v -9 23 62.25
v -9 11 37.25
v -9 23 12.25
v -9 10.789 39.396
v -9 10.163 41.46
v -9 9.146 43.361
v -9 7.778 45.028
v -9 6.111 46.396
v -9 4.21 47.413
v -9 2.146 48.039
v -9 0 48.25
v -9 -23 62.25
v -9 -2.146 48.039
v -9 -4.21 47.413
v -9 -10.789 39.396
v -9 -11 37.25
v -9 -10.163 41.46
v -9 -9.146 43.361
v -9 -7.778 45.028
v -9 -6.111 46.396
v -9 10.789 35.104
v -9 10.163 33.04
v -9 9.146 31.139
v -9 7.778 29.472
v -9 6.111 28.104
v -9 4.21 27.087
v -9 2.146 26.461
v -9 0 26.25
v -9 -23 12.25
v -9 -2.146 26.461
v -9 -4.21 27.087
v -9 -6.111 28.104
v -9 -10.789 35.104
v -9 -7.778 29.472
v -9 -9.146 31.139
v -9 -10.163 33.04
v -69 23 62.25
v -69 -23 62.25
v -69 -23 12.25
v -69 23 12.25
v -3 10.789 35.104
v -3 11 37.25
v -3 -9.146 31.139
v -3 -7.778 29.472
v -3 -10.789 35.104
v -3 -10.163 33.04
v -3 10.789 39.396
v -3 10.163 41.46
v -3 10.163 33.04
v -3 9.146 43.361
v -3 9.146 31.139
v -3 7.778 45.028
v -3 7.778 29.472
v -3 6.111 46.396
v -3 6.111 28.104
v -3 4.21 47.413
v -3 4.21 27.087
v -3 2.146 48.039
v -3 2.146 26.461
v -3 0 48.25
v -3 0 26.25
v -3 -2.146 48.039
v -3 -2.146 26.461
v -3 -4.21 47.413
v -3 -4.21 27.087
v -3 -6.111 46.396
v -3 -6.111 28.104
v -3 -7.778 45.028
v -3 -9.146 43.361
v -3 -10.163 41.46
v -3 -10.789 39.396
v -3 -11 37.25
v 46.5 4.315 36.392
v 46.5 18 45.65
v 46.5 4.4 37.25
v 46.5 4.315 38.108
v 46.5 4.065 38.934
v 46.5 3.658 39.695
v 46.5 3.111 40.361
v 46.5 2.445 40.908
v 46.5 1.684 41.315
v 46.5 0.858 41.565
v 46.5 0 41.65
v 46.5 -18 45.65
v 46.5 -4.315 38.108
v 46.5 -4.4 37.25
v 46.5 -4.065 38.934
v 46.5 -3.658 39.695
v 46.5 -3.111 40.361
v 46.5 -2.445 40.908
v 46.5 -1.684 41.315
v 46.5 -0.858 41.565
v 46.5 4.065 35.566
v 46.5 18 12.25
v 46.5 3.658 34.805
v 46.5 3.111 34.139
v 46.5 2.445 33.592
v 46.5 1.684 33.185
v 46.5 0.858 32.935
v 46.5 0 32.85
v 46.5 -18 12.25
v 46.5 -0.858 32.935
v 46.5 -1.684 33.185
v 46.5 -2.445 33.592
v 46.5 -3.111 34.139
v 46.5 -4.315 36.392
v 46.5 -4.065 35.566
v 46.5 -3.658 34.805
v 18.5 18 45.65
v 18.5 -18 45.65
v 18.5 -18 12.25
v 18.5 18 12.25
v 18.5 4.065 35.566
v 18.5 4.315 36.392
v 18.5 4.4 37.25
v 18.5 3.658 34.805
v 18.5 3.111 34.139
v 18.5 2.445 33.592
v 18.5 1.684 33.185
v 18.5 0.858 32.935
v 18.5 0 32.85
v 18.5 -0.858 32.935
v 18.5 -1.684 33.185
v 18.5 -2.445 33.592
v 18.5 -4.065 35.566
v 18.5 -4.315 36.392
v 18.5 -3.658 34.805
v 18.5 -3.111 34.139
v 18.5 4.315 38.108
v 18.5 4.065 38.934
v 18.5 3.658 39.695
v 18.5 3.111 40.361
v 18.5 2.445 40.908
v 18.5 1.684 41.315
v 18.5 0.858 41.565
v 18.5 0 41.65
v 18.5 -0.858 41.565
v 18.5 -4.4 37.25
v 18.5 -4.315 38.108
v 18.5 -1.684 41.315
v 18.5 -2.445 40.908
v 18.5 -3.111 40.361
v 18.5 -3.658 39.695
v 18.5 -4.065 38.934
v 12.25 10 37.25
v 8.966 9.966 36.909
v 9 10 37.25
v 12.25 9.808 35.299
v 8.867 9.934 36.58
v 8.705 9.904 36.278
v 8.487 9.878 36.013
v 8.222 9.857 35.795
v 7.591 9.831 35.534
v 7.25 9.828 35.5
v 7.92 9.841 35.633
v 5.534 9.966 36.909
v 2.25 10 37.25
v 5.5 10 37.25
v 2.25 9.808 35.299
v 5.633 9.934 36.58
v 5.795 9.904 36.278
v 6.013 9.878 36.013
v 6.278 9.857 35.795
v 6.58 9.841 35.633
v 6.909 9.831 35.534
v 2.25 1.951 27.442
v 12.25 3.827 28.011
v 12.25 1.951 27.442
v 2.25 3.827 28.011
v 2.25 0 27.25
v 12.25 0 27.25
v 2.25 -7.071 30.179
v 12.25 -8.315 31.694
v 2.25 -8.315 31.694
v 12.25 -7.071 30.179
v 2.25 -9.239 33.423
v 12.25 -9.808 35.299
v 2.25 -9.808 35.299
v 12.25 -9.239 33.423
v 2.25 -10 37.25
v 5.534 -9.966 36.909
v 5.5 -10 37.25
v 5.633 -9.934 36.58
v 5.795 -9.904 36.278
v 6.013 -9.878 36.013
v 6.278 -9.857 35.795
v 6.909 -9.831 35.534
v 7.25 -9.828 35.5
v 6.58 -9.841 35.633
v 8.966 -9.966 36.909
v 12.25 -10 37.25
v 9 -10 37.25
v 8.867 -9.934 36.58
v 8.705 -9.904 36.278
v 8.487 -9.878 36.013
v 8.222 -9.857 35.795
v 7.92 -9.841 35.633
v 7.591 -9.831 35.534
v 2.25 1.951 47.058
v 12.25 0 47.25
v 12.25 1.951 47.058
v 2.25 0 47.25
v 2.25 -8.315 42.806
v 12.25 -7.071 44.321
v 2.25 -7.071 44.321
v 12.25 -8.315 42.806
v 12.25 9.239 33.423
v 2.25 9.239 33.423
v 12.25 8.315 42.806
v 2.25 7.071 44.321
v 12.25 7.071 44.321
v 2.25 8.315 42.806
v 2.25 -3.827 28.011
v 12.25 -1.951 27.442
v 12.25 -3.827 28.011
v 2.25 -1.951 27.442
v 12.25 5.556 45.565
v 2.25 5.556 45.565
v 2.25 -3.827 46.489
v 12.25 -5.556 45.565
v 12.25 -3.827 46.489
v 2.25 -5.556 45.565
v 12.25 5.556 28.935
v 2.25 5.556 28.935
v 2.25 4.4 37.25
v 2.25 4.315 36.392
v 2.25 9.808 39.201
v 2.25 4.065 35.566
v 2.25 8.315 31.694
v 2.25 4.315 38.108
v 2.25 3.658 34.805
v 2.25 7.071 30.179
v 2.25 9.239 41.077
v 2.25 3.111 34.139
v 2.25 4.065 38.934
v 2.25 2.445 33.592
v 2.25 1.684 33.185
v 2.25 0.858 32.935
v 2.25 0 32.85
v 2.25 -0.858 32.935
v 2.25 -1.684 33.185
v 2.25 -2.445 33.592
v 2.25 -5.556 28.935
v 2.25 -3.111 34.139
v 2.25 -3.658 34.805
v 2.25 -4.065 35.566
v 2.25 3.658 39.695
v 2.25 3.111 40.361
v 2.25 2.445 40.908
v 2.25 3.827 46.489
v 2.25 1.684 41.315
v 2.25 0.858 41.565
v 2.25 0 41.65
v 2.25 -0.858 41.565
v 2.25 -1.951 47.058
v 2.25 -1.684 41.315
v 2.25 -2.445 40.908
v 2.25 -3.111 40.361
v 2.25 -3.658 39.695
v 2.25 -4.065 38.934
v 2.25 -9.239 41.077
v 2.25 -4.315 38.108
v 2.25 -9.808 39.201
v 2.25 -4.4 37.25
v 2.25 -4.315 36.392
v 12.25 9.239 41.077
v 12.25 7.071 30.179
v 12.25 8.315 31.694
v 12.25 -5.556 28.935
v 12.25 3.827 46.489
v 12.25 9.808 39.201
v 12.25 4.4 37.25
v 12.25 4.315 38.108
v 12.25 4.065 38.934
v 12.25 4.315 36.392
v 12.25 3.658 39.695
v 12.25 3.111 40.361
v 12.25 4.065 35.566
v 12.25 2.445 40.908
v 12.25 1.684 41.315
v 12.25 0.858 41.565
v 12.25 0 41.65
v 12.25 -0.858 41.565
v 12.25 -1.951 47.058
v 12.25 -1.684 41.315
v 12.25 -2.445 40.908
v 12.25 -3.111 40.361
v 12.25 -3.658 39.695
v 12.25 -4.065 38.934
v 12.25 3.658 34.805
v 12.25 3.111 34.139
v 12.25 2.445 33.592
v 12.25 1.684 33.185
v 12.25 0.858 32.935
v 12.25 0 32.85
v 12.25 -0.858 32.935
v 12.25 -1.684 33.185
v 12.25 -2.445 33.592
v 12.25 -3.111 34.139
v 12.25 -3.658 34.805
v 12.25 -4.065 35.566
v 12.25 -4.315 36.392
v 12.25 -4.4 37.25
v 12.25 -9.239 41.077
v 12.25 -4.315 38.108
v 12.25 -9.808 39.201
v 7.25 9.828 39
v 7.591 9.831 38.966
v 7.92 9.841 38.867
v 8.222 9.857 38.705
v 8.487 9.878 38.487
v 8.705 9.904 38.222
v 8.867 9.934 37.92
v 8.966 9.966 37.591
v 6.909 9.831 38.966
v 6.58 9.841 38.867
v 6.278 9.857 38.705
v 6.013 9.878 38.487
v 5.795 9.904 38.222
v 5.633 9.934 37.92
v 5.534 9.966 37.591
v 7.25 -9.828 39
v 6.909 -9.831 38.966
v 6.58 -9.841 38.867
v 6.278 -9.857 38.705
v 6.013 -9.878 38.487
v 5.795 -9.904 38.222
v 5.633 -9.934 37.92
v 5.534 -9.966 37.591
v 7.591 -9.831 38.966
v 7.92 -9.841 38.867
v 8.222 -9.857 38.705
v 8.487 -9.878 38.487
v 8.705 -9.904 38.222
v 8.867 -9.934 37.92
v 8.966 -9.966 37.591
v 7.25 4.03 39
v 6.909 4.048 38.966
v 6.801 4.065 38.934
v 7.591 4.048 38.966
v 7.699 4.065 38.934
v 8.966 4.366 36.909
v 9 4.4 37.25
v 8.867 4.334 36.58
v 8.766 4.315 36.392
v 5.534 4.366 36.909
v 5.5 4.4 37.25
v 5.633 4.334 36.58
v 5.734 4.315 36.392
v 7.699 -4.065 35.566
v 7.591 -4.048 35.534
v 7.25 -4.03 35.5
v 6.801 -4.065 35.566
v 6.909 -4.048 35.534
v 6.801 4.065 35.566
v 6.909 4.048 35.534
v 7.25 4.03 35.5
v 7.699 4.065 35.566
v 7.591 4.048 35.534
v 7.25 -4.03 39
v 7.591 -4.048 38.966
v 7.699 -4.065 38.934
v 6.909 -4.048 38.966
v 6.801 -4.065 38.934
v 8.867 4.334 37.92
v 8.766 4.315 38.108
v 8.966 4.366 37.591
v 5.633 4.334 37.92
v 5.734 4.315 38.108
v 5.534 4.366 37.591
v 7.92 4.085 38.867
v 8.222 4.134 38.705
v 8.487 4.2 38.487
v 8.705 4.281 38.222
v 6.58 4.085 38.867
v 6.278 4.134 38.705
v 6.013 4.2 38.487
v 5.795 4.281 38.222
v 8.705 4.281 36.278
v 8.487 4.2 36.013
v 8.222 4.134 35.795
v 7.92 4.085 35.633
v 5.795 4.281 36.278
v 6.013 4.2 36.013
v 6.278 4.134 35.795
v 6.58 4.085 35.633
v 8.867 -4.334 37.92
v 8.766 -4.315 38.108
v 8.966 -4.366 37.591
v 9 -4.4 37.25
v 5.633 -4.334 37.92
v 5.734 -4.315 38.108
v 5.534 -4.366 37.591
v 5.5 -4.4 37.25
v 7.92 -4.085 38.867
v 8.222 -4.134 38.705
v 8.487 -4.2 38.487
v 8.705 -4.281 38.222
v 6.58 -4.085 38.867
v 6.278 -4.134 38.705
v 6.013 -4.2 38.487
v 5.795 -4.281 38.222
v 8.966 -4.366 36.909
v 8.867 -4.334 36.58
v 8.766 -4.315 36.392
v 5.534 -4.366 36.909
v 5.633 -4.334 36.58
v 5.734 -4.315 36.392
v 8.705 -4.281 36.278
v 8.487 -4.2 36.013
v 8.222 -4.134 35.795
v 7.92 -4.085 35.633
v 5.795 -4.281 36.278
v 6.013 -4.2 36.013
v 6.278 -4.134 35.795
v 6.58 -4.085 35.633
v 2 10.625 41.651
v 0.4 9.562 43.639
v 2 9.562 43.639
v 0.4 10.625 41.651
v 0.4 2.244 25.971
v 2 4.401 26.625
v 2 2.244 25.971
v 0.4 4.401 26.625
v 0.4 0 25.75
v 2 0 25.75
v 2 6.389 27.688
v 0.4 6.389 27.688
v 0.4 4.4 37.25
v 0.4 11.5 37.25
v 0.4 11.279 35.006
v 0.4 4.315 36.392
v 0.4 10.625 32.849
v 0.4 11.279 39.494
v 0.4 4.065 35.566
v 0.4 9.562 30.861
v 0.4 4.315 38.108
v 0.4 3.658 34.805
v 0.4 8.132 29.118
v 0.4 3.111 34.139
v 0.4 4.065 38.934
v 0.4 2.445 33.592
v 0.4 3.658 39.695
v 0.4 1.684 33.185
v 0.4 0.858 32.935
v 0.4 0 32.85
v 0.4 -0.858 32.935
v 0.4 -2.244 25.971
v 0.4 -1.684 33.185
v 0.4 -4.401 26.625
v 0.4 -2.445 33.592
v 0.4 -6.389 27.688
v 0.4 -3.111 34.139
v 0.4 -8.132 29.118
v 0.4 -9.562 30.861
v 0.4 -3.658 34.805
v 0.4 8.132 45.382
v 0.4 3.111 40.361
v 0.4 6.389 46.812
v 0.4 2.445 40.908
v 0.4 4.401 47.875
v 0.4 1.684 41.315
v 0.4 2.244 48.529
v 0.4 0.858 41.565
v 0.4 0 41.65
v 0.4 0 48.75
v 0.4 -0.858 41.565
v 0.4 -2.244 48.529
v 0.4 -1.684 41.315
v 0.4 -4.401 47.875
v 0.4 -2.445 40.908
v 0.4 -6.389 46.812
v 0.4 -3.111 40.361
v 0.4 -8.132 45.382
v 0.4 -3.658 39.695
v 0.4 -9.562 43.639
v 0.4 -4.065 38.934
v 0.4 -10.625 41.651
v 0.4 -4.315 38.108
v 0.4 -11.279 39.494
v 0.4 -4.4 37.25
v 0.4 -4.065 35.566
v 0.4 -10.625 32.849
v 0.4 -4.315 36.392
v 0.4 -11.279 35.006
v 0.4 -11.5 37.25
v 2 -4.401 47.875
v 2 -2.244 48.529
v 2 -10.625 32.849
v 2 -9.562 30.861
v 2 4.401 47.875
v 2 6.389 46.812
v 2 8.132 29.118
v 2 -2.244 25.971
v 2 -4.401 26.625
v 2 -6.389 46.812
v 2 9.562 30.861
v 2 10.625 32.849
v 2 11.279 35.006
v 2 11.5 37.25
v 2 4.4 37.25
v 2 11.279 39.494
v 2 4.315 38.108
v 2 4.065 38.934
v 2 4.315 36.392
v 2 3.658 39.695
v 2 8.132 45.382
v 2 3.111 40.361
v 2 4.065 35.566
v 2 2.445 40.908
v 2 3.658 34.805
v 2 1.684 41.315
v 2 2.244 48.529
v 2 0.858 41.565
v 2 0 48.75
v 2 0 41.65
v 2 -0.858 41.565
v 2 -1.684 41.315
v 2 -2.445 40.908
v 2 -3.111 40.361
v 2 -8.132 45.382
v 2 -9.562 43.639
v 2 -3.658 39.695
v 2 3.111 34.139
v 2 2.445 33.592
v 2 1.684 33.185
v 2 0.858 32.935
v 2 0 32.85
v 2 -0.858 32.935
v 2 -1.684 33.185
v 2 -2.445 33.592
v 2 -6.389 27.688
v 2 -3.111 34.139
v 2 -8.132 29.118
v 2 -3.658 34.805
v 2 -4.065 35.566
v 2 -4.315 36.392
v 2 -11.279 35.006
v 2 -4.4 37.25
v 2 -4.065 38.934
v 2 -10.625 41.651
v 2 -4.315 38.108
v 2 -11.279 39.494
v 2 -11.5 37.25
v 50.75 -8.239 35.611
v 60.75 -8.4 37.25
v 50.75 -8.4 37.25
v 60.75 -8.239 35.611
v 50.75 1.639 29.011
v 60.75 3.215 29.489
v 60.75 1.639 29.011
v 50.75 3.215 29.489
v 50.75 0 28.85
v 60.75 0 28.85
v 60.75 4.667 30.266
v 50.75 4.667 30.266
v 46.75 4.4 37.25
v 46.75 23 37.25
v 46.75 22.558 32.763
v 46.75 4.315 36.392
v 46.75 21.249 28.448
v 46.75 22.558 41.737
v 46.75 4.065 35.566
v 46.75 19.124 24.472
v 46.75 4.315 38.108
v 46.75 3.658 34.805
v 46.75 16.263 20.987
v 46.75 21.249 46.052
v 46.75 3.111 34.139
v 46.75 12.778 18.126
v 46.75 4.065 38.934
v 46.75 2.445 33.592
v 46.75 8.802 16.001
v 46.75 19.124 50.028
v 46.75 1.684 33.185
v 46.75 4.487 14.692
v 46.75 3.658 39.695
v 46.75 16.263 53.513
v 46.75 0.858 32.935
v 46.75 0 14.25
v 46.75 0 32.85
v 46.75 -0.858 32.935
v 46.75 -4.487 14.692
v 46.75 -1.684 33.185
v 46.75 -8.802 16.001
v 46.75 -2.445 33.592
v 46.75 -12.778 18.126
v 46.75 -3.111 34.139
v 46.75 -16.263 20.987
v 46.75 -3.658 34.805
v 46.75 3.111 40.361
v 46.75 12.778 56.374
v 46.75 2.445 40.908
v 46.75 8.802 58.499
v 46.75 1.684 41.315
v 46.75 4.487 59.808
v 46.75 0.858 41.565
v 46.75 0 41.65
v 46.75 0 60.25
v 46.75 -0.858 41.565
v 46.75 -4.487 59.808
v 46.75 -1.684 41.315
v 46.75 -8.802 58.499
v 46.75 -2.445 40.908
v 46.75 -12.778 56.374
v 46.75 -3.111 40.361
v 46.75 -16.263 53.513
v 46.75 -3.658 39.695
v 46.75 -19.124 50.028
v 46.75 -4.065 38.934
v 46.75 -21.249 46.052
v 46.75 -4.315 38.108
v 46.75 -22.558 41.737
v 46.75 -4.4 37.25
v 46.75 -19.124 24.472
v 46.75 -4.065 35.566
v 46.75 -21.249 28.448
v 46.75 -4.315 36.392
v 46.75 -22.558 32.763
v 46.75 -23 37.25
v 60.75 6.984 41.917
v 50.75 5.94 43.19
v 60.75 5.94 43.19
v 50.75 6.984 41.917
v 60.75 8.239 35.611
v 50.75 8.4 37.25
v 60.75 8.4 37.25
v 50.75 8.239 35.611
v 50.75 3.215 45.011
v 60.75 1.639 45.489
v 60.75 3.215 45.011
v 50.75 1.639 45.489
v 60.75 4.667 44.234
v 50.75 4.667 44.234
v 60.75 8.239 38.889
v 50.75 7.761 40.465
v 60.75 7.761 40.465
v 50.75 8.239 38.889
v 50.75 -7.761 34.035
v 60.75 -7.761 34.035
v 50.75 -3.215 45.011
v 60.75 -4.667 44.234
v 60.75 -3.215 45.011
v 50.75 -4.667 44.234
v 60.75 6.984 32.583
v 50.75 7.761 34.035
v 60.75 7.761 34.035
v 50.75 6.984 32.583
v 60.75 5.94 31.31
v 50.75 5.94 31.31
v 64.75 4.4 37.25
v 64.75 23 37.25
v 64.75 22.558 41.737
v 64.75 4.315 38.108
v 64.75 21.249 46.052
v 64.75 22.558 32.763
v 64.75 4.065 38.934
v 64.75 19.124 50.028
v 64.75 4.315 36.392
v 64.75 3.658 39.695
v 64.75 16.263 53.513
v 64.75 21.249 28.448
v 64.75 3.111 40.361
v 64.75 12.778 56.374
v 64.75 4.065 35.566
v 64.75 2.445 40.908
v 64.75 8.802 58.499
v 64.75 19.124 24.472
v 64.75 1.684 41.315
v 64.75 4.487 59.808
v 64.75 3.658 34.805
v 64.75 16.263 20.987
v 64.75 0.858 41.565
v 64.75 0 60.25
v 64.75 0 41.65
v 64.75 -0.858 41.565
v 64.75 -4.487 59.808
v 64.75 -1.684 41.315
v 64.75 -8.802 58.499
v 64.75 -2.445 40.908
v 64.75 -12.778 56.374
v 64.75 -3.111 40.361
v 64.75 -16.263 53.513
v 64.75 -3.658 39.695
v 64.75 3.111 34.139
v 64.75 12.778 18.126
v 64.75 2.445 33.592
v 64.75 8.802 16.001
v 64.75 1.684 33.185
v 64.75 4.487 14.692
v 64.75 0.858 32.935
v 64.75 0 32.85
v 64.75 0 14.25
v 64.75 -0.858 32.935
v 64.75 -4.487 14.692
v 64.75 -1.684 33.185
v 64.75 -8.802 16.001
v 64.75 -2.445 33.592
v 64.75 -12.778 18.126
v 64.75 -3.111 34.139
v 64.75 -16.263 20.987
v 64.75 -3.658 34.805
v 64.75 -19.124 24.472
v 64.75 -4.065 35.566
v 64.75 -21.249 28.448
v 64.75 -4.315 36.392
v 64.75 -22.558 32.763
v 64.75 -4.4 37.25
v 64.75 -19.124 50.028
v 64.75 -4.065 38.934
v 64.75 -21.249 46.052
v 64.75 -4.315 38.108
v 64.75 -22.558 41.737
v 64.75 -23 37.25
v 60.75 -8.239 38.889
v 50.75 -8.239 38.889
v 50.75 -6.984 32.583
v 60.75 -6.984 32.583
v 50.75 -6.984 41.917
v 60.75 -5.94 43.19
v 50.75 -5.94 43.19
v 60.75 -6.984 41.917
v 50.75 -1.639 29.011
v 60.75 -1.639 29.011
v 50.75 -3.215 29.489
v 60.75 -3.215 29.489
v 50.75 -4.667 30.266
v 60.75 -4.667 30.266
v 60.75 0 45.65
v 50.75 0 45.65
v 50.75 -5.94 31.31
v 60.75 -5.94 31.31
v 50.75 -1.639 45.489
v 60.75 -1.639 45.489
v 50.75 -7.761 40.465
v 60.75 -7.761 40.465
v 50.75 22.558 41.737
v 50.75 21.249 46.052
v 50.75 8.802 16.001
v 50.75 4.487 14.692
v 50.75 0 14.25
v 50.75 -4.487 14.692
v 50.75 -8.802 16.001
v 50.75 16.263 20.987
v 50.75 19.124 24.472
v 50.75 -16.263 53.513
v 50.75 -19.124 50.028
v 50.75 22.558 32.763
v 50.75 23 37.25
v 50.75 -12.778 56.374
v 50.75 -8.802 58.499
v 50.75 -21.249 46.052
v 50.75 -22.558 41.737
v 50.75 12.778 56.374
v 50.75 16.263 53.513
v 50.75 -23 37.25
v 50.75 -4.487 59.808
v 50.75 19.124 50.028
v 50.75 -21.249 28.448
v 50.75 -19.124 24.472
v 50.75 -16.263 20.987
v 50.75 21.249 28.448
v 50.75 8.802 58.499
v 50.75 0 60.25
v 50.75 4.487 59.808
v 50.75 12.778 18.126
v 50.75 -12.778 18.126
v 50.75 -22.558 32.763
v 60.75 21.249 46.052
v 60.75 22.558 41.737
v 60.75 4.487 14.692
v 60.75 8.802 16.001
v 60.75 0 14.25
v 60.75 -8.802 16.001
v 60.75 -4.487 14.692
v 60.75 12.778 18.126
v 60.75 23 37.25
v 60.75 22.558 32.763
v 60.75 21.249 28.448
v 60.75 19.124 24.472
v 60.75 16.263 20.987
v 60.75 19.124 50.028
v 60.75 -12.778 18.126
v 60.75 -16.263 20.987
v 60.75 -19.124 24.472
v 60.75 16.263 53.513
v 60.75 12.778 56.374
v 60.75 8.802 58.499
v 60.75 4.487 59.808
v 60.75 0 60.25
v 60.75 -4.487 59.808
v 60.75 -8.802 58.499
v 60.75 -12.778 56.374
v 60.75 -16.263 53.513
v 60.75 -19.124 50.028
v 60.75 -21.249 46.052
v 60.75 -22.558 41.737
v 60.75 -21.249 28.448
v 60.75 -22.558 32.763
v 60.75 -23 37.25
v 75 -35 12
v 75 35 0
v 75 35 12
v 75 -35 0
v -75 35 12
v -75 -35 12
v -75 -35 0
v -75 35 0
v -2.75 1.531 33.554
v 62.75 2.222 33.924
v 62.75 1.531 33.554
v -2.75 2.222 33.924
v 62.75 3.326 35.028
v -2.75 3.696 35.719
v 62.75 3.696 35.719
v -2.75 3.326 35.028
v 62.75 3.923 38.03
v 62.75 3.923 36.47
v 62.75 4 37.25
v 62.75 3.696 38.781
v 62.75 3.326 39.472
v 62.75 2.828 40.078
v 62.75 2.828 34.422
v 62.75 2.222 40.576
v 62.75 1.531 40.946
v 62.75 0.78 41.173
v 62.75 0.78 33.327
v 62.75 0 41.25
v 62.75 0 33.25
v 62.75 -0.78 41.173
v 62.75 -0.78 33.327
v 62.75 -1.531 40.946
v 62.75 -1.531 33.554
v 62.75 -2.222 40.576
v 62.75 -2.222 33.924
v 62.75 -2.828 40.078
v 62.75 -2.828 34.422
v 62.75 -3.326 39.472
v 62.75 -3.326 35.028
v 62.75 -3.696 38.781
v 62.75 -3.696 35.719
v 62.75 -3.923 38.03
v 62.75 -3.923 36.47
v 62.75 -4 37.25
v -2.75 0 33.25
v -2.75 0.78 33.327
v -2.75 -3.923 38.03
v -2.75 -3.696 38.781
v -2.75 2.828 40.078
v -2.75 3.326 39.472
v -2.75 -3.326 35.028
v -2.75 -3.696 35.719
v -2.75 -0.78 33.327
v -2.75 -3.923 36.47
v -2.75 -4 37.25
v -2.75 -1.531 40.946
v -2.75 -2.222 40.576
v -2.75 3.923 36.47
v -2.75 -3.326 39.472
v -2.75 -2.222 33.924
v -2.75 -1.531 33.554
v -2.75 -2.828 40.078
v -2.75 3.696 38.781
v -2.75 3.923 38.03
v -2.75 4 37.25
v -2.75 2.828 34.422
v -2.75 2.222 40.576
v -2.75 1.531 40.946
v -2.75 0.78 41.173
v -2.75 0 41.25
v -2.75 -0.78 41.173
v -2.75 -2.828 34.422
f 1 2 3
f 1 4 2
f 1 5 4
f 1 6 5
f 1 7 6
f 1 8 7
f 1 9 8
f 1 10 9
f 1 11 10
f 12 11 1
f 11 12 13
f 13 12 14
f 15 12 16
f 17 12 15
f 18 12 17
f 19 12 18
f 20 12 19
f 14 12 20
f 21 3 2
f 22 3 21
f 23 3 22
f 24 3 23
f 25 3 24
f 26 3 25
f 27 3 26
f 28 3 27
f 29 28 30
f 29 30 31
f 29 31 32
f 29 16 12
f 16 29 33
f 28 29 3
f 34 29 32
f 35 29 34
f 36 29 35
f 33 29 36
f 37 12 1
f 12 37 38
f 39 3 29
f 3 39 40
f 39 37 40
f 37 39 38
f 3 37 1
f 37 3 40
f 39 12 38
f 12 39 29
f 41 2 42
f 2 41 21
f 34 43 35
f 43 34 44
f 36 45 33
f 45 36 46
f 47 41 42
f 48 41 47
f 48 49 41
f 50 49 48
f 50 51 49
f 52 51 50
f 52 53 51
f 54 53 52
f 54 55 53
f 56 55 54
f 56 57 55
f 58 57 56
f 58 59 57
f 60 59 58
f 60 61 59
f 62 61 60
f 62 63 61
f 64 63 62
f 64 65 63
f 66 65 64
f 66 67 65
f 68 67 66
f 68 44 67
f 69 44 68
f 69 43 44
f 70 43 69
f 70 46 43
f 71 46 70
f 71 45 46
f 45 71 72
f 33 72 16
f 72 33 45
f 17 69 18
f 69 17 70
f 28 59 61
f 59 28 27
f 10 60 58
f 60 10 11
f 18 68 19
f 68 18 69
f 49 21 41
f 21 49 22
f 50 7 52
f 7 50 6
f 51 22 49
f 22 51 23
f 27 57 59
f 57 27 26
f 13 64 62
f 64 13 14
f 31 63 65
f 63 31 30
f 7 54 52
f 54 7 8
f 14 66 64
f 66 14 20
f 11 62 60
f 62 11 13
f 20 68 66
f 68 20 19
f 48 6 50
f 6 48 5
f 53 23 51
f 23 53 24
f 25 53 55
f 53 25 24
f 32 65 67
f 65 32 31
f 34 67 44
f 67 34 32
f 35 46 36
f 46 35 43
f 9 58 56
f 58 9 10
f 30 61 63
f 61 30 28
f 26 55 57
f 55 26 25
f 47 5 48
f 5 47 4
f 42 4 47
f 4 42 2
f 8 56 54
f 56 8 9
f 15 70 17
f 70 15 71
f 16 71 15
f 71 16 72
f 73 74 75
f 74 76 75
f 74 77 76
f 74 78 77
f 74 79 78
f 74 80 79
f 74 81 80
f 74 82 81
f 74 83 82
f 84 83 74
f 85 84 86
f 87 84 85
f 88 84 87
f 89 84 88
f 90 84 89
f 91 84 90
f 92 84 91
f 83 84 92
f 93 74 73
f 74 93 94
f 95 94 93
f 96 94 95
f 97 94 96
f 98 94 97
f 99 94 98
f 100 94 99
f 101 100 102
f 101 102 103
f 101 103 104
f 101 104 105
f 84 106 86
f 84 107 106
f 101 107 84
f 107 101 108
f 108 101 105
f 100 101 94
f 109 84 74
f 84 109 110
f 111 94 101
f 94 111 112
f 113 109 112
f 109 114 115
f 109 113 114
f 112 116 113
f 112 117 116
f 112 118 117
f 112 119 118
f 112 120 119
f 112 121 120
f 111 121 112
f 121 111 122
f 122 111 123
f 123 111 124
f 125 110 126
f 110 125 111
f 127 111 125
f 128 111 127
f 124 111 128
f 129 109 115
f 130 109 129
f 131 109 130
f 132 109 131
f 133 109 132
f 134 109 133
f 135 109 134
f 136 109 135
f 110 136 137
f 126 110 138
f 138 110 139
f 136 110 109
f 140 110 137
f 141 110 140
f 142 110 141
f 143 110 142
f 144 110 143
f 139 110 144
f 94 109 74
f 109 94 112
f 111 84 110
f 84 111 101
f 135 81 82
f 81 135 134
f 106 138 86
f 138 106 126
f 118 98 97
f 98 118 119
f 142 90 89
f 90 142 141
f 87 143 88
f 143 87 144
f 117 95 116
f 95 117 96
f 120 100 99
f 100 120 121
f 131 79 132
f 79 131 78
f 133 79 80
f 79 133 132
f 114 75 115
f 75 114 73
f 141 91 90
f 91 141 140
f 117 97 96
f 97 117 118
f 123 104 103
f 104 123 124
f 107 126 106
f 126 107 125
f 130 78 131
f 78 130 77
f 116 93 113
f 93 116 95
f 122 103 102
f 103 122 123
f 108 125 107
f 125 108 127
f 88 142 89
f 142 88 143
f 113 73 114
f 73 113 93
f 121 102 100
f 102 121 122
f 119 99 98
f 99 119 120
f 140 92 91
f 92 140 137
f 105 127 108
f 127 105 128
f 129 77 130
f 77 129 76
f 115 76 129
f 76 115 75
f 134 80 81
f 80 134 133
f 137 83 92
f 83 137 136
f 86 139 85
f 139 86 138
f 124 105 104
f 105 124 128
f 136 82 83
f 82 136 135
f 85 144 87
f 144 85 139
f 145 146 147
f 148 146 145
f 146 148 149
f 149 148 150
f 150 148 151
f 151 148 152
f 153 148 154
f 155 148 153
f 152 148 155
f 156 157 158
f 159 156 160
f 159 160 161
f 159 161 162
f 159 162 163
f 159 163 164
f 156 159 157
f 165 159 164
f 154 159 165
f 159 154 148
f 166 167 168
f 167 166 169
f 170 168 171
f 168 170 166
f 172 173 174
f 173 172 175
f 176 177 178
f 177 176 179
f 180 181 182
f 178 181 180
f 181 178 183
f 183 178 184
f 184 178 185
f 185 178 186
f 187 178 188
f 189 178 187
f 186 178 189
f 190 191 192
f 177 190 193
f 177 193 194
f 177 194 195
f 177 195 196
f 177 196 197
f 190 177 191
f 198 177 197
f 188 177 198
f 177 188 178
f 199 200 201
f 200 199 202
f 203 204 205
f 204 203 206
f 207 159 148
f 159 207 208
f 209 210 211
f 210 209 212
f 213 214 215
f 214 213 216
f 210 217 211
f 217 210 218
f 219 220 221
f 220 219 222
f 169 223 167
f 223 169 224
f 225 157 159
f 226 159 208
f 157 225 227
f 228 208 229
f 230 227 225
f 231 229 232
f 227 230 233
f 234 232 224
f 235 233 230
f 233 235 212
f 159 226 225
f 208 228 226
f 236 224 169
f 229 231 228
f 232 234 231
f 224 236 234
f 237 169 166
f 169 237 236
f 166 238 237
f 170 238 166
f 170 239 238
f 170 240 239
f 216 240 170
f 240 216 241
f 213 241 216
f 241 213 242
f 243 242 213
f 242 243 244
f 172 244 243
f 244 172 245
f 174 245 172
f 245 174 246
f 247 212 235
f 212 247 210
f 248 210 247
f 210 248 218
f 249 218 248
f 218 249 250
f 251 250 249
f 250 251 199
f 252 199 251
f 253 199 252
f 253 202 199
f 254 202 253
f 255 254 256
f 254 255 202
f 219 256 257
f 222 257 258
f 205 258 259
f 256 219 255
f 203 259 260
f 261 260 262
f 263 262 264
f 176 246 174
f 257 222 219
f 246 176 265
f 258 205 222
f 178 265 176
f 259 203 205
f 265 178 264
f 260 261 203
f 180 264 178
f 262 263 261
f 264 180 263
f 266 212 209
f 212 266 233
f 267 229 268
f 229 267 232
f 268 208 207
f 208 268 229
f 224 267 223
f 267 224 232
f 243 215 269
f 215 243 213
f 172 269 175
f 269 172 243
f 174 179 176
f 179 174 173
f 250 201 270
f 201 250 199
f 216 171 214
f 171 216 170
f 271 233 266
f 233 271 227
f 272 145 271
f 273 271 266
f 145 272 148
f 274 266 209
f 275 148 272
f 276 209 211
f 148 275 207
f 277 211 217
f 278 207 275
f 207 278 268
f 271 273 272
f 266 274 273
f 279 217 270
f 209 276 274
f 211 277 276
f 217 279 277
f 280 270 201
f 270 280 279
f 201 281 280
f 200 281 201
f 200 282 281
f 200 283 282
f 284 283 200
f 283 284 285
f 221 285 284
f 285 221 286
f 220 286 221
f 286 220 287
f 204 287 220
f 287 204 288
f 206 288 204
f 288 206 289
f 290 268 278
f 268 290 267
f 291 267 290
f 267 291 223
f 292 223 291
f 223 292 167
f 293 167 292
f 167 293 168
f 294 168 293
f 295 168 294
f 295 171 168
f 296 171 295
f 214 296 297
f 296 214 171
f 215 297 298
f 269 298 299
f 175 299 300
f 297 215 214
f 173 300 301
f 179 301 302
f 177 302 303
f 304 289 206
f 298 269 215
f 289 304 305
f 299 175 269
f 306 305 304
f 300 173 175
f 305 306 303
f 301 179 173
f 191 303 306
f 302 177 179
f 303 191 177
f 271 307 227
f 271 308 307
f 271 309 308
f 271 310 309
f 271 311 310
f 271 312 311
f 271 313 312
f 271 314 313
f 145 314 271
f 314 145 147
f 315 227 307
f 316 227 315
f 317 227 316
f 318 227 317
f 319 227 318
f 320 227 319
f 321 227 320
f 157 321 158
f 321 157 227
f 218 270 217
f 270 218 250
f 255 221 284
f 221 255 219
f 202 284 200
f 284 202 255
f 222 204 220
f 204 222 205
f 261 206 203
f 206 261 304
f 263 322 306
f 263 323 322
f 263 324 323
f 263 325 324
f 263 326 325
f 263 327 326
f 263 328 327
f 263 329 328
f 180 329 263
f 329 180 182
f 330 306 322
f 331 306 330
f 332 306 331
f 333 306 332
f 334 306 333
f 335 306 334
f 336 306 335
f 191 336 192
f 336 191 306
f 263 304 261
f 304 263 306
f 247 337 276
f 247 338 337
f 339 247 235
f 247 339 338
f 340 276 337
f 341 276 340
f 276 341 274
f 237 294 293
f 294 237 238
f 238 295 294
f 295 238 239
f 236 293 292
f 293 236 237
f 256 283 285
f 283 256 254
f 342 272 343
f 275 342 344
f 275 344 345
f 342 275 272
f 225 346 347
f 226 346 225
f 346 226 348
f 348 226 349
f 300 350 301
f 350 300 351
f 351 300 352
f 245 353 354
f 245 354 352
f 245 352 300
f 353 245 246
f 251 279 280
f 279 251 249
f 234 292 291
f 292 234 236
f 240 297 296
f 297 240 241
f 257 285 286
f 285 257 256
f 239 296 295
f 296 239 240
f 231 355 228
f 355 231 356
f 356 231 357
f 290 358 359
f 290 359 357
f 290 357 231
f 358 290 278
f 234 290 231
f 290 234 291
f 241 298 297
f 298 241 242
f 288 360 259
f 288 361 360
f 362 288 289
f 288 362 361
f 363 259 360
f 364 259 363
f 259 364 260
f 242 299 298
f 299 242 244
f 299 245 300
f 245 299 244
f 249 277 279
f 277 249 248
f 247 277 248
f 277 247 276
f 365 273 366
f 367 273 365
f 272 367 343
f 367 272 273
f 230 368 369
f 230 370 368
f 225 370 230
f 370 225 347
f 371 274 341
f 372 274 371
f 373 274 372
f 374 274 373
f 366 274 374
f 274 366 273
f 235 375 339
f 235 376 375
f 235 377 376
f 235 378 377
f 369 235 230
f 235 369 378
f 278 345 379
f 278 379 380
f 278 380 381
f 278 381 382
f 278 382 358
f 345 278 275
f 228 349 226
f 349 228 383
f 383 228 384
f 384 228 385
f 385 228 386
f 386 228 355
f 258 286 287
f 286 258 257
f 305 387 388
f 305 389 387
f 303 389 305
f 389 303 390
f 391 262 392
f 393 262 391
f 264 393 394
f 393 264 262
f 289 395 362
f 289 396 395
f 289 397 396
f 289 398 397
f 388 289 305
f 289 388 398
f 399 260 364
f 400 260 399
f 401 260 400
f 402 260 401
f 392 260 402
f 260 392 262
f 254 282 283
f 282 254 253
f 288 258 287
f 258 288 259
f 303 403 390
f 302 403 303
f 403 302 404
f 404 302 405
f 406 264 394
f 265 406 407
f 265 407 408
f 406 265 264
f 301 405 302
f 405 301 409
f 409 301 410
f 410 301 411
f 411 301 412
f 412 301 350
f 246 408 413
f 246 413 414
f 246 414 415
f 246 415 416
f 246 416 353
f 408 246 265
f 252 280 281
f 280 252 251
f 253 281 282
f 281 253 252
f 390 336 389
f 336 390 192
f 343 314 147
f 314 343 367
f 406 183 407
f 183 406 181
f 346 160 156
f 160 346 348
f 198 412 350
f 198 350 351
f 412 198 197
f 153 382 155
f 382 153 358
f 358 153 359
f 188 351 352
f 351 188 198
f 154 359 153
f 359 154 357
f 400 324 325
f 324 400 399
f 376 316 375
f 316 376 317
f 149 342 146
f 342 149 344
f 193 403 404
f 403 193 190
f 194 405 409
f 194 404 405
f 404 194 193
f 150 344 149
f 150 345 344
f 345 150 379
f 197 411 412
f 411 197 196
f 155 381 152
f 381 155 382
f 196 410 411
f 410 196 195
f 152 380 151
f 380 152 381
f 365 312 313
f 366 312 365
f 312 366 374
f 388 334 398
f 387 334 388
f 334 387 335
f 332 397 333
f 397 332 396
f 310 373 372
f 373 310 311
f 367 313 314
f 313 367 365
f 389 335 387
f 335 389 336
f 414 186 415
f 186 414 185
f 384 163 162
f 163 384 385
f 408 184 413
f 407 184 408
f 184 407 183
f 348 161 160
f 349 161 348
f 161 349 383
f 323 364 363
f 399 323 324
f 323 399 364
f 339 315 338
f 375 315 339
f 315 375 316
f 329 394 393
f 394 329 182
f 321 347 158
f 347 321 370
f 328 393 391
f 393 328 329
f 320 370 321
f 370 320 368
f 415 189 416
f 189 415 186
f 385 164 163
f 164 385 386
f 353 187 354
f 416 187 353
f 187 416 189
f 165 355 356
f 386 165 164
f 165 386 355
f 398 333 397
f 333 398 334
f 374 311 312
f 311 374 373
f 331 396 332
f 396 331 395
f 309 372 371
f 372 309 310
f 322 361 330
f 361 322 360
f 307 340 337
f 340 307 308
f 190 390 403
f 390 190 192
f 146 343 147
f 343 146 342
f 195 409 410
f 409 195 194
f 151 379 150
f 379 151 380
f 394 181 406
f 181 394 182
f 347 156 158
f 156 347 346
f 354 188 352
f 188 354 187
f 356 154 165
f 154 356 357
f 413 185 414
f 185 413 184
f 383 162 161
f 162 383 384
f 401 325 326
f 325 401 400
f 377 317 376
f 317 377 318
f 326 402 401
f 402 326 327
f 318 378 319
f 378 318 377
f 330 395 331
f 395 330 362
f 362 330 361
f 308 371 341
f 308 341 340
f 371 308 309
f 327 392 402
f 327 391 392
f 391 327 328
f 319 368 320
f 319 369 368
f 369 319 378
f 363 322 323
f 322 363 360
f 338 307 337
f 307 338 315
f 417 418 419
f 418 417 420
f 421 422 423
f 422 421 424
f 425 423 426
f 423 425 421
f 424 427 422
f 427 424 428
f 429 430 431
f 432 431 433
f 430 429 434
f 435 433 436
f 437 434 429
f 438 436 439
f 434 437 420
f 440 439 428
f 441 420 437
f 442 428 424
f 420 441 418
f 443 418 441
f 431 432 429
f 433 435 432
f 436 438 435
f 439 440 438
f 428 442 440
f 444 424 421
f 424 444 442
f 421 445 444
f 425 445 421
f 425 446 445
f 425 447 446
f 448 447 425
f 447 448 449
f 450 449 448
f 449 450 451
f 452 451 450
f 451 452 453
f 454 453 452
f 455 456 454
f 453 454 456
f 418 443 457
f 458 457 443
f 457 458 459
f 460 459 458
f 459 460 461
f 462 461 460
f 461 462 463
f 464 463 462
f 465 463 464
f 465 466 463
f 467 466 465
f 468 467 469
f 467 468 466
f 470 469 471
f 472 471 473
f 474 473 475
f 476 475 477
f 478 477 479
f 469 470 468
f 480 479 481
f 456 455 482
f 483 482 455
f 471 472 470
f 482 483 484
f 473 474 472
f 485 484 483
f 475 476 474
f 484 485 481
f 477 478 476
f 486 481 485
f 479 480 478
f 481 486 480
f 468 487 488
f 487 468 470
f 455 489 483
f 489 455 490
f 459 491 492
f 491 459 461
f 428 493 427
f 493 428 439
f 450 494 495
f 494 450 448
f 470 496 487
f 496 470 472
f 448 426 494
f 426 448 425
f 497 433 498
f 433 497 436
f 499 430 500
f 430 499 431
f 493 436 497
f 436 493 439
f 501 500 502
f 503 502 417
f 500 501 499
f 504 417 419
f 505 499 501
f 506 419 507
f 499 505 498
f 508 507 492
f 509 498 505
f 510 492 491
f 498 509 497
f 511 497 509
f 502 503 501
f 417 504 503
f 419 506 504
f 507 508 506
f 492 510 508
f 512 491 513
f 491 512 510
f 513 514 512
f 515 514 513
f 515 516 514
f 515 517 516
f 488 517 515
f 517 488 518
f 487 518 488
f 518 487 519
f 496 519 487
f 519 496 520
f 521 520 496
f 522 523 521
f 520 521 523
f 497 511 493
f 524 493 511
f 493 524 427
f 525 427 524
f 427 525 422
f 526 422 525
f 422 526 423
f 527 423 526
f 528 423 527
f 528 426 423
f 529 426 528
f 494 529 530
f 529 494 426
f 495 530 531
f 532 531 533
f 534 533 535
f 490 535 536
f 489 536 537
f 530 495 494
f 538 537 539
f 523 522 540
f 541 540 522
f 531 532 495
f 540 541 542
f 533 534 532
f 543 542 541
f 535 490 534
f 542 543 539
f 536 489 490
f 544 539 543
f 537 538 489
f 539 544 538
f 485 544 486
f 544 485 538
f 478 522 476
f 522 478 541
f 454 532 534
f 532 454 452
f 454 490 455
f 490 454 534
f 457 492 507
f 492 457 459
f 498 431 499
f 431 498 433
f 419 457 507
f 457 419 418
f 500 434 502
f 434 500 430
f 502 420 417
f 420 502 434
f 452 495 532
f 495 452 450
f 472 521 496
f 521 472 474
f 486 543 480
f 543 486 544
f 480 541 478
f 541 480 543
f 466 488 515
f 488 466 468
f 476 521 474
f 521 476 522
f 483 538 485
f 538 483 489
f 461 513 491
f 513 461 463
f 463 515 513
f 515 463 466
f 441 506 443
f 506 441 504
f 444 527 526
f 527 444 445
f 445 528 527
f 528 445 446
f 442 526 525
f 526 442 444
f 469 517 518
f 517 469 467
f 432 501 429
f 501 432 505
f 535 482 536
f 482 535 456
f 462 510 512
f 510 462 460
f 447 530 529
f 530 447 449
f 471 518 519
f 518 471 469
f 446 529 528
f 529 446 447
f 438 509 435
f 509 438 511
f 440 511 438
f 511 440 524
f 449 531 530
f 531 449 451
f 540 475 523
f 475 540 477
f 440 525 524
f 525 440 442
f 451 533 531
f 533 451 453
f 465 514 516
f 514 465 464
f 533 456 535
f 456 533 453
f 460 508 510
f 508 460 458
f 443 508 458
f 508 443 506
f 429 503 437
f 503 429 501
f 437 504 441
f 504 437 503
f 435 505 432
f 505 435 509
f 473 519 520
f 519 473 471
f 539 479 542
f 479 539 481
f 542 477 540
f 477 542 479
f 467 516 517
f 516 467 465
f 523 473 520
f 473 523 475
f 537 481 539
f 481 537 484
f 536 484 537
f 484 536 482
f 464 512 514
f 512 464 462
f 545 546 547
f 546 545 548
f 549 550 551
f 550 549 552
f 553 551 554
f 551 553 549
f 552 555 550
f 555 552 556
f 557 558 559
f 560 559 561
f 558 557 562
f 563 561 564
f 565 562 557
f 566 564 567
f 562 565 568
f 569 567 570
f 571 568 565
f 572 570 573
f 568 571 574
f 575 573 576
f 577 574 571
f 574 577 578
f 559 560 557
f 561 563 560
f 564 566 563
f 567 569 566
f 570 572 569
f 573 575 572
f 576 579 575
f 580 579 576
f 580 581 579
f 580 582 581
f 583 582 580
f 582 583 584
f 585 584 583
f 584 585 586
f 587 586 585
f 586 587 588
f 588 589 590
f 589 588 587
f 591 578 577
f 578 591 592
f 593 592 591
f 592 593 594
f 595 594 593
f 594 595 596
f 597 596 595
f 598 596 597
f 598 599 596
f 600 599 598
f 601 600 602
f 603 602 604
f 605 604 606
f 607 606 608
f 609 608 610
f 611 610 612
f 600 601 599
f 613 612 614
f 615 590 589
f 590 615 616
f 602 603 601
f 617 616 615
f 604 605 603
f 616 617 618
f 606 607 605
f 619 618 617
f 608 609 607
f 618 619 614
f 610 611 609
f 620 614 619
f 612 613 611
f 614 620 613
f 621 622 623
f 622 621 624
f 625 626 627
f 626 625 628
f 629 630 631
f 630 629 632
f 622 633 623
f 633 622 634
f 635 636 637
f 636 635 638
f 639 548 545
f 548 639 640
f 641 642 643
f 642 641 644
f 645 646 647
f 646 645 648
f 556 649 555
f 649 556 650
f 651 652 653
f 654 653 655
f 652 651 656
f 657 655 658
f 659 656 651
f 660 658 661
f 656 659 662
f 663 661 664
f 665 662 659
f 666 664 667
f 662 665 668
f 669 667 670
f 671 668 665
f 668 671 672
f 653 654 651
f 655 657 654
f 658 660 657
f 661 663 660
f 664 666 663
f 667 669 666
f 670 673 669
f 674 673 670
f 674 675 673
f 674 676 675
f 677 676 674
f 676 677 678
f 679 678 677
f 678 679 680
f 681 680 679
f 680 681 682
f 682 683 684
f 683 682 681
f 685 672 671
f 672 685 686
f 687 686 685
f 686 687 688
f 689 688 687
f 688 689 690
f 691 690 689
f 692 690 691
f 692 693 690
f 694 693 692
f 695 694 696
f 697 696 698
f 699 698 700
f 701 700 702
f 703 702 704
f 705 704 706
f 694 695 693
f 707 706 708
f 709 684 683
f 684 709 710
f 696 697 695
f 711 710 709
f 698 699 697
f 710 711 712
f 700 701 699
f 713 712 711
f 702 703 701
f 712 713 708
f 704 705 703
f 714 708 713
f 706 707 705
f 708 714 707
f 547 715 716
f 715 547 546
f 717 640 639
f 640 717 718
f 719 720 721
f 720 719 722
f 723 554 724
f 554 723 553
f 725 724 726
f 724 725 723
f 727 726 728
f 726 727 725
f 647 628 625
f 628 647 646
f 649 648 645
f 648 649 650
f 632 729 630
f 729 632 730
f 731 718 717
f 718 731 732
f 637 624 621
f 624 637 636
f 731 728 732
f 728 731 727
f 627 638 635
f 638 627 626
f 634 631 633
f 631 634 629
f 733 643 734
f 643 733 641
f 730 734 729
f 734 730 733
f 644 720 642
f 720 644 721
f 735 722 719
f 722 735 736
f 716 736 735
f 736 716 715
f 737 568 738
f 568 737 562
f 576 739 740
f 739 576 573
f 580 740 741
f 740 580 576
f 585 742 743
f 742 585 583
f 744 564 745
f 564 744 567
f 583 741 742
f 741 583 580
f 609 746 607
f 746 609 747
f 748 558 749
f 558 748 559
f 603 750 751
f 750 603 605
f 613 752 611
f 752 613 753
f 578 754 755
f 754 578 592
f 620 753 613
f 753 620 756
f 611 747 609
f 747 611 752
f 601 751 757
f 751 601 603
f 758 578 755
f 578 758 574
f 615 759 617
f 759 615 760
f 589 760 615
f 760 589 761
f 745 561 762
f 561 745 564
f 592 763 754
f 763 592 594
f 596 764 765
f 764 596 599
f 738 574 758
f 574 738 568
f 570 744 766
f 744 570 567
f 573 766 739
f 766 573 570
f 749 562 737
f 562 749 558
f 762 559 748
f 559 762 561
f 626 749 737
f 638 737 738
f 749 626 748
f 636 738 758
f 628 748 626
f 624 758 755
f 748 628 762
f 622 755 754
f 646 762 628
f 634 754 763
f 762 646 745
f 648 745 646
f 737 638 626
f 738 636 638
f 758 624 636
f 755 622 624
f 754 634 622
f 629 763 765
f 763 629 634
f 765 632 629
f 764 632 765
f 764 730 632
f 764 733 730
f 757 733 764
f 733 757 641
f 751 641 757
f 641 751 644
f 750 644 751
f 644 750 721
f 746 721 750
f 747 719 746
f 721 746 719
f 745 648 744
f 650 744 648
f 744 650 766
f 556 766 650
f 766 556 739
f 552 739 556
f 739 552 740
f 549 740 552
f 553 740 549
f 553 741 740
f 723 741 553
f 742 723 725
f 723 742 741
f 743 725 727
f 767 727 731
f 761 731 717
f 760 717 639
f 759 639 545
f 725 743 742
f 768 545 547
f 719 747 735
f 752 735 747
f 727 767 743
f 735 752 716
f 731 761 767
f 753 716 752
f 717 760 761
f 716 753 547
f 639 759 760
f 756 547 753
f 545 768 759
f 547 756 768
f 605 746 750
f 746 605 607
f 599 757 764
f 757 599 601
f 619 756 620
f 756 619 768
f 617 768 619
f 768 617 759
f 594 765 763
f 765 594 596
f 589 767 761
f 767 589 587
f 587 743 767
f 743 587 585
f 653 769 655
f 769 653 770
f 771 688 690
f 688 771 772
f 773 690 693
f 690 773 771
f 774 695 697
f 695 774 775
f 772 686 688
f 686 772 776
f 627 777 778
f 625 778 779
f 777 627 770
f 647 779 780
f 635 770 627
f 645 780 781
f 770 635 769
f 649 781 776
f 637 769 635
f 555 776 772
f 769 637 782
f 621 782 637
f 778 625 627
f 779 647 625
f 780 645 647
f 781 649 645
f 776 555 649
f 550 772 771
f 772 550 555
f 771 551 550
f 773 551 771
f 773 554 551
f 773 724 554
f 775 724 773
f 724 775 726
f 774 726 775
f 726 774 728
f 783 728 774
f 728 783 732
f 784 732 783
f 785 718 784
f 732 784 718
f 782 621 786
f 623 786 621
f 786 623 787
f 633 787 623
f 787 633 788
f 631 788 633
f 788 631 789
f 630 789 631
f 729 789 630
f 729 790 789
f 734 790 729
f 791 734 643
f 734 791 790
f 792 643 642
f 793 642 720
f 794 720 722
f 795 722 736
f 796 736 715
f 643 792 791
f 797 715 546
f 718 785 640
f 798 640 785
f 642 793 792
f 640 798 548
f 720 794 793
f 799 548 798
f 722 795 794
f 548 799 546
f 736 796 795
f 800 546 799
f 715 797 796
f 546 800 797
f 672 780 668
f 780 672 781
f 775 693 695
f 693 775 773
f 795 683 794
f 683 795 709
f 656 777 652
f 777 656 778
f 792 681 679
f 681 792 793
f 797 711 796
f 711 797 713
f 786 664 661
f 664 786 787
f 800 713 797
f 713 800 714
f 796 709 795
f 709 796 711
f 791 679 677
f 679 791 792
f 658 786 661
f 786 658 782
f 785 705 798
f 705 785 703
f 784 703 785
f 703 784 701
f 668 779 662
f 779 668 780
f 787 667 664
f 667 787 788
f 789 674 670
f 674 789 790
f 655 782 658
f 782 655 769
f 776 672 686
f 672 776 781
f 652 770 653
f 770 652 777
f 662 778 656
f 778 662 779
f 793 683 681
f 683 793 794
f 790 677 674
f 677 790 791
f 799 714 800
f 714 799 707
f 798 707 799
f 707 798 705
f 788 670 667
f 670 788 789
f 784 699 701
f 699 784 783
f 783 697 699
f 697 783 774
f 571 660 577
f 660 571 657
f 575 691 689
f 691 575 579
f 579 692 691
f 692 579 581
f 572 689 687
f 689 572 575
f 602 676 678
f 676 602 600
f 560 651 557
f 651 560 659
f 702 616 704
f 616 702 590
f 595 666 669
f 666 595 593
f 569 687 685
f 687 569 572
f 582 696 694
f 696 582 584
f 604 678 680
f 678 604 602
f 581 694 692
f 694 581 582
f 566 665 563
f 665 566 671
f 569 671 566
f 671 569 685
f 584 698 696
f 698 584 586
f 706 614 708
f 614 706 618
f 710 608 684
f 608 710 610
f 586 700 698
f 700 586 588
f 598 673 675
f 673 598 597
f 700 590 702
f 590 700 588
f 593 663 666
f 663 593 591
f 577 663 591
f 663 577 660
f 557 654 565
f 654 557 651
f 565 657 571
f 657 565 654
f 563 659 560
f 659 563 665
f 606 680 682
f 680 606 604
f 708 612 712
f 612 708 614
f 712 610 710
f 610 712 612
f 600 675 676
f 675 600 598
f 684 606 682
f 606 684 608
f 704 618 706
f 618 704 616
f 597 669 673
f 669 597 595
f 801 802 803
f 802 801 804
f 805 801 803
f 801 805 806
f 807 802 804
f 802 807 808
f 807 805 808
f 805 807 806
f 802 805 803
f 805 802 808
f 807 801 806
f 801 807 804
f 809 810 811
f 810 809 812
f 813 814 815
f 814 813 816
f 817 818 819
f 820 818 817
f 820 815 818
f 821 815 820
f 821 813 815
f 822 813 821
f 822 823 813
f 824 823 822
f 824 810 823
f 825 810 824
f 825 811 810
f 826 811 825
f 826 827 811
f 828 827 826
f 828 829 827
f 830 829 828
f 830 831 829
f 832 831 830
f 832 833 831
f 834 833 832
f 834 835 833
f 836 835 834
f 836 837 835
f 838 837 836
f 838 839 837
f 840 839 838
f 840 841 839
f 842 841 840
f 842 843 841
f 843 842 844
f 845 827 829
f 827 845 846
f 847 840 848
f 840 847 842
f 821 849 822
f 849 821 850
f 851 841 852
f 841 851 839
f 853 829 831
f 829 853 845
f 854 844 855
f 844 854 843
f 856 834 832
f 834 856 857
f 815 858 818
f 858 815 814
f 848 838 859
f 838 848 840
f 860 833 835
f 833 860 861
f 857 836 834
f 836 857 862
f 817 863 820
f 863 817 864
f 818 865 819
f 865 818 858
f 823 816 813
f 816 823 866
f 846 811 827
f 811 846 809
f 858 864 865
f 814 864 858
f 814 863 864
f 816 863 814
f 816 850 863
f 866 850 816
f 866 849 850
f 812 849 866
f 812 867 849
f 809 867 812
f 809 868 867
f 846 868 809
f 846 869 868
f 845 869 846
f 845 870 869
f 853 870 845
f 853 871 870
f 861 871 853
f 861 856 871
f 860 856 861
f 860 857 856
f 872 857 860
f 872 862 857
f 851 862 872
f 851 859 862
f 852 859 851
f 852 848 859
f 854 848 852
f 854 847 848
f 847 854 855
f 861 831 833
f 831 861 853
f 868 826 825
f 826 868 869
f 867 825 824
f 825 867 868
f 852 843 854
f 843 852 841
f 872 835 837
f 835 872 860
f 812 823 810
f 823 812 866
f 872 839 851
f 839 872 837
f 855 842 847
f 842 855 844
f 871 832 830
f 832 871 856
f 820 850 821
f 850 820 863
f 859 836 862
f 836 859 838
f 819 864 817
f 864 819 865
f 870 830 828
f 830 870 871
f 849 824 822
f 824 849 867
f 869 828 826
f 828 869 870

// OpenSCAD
$fn = 32;

// ------------------------------------------------------------------------
// Motor drive station: motor 60 x 50 mm, shaft d8, pulley d46
// Every part is its own module, assembly() places every instance.
// ------------------------------------------------------------------------

// --- part 1 ---
module station_bed() {
  difference() {
    translate([-75, -35, 0]) cube([150, 70, 12]);
  }
}

// --- part 2 ---
module drive_motor() {
  union() {
    translate([-30, -23, 0]) cube([60, 46, 50]);
    translate([33, 0, 25]) rotate([0, 90, 0]) cylinder(h = 6, d = 22, center = true);
  }
}

// --- part 3 ---
module pillow_block() {
  difference() {
    translate([-14, -18, 0]) cube([28, 36, 33.4]);
    translate([0, 0, 25]) rotate([0, 90, 0]) cylinder(h = 30, d = 8.8, center = true);
  }
}

// --- part 4 ---
module drive_shaft() {
  translate([0, 0, -32.75]) cylinder(h = 65.5, d = 8);
}

// --- part 5 ---
module shaft_collar() {
  difference() {
    cylinder(h = 10, d = 20);
    translate([0, 0, -1]) cylinder(h = 12, d = 8.8);
    translate([0, 0, 5]) rotate([90, 0, 0]) cylinder(h = 22, d = 3.5, center = true);
  }
}

// --- part 6 ---
module collar_washer() {
  difference() {
      translate([0, 0, 0]) cylinder(h = 1.6, d = 23);
      translate([0, 0, -1]) cylinder(h = 3.6, d = 8.8);
    }
}

// --- part 7 ---
module drive_pulley() {
  difference() {
    union() {
      cylinder(h = 18, d = 16.8);
      cylinder(h = 4, d = 46);
      translate([0, 0, 14]) cylinder(h = 4, d = 46);
    }
    translate([0, 0, -1]) cylinder(h = 20, d = 8.8);
  }
}

// --- assembly ---
module assembly() {
  color([0.80, 0.24, 0.20]) translate([0, 0, 0]) rotate([0, 0, 0]) station_bed();
  color([0.20, 0.45, 0.75]) translate([-39, 0, 12.25]) rotate([0, 0, 0]) drive_motor();
  color([0.25, 0.62, 0.32]) translate([32.5, 0, 12.25]) rotate([0, 0, 0]) pillow_block();
  color([0.92, 0.70, 0.18]) translate([30, 0, 37.25]) rotate([0, 90, 0]) drive_shaft();
  color([0.58, 0.35, 0.70]) translate([2.25, 0, 37.25]) rotate([0, 90, 0]) shaft_collar();
  color([0.16, 0.66, 0.66]) translate([0.4, 0, 37.25]) rotate([0, 90, 0]) collar_washer();
  color([0.85, 0.48, 0.18]) translate([46.75, 0, 37.25]) rotate([0, 90, 0]) drive_pulley();
}

assembly();
